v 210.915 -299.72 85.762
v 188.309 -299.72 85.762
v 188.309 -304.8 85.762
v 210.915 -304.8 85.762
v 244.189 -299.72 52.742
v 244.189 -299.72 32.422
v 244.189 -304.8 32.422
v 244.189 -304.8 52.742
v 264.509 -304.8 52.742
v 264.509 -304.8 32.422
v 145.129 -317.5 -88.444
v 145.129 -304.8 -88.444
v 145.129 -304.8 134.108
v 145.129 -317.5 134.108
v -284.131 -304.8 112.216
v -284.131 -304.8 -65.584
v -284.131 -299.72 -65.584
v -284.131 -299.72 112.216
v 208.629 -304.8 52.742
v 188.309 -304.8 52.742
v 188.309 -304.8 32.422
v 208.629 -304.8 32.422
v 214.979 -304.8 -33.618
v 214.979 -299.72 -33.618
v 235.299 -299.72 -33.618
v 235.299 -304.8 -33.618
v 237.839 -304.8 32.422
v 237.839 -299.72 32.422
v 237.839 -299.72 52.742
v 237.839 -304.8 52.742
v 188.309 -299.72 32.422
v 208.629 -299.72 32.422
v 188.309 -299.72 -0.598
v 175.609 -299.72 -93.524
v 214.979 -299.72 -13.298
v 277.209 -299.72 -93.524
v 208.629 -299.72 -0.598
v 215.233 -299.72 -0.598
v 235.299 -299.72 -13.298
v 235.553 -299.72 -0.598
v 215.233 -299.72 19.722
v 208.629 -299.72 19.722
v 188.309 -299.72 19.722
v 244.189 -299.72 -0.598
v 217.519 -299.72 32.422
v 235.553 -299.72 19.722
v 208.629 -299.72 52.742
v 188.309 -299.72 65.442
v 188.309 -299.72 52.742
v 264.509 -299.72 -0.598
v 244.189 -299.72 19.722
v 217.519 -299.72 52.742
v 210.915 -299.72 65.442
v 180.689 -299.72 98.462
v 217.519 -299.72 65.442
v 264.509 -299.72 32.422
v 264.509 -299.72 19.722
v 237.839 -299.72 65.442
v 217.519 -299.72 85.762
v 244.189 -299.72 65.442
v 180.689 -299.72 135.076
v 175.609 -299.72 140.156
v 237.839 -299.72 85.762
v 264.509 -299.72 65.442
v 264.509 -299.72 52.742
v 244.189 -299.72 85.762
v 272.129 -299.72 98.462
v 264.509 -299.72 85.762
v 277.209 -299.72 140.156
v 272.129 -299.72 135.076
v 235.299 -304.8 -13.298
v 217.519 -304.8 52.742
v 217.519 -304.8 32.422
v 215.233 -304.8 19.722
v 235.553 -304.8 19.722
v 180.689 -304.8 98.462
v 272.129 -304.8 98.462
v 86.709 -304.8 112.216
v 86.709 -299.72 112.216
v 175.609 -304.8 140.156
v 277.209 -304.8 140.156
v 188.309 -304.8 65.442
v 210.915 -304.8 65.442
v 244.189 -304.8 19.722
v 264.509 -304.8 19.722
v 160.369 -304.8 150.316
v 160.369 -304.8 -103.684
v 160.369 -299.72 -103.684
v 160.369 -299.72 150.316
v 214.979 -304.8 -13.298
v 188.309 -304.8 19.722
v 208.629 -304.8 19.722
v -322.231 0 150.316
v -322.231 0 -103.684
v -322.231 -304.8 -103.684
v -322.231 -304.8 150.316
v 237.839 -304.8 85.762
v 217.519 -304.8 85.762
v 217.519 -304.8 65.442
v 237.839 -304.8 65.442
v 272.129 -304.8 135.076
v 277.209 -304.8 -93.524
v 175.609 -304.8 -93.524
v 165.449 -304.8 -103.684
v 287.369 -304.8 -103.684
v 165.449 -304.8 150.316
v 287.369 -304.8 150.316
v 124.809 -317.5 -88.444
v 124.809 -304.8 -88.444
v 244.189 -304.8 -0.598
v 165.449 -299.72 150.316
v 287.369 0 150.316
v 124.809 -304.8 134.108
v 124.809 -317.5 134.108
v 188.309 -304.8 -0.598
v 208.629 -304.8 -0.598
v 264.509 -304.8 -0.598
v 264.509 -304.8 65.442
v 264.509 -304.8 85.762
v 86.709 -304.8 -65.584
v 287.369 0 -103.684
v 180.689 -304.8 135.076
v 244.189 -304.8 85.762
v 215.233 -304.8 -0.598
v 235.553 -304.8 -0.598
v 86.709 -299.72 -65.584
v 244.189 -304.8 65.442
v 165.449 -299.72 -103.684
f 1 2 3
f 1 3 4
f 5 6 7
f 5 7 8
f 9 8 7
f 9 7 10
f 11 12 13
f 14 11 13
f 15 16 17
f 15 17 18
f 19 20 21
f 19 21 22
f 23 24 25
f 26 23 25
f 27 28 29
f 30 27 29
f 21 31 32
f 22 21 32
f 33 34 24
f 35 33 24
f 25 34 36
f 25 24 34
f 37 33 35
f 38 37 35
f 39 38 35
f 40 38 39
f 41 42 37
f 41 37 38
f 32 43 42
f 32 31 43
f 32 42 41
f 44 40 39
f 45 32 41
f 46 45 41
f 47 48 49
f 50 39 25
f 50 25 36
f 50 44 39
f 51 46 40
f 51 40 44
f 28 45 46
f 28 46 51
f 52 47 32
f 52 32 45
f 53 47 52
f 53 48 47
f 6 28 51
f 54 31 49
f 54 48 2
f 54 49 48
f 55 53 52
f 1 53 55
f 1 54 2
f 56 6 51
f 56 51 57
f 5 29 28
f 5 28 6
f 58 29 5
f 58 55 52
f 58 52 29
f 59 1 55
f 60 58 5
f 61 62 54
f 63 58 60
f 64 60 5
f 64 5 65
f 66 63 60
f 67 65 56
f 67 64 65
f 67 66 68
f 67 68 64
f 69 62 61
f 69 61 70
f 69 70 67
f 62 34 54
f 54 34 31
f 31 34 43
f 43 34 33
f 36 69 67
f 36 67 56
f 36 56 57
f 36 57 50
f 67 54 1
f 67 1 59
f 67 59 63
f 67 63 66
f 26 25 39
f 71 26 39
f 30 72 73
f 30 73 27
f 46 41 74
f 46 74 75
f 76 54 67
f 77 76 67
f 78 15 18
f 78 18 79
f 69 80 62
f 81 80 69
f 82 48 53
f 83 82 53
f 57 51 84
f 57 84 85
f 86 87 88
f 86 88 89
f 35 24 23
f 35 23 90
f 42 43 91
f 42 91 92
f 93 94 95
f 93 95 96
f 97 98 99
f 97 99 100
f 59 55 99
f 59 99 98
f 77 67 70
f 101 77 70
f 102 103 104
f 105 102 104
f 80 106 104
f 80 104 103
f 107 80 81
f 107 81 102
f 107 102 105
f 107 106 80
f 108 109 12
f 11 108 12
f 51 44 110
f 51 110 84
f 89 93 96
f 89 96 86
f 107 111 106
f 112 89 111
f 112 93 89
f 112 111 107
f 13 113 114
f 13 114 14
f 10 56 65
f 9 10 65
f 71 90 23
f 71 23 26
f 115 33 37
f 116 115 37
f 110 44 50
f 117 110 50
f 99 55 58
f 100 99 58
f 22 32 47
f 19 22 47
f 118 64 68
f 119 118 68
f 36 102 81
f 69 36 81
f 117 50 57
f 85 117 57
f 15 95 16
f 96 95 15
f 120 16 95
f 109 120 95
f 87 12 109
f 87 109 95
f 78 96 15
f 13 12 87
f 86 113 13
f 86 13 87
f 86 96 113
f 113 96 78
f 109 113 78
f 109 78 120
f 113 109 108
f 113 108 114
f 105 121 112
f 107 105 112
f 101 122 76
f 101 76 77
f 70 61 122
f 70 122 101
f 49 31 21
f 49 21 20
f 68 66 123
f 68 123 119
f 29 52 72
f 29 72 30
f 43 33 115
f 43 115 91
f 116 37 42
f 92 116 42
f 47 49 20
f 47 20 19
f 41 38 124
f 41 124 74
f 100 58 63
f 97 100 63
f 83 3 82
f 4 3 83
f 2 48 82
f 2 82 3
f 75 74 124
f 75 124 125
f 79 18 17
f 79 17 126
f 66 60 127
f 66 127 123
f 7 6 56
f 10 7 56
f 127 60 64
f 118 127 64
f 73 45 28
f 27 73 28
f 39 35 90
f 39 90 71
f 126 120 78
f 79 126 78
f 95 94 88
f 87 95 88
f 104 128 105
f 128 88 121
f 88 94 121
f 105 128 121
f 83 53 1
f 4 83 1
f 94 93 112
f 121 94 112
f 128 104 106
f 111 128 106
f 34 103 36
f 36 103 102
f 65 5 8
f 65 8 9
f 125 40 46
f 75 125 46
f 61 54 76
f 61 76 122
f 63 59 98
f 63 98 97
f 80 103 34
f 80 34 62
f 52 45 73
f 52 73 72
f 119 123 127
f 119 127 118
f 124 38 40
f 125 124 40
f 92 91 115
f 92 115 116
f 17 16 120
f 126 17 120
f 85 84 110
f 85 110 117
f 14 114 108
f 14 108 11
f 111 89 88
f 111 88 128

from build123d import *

# Parameters (mm, degrees)
F0_W      = 609.6
F0_H      = 254
F1_DEPTH  = 304.8
F2_W      = 101.6
F2_H      = 233.68
F3_DEPTH  = 5.08
F4_W      = 5.08
F4_H      = 254
F5_DEPTH  = 5.08
F6_W      = 91.44
F6_H      = 36.614052
F6_W_2    = 22.606
F6_H_2    = 20.32
F6_W_3    = 20.32
F7_DEPTH  = 5.08
F8_W      = 20.32
F8_H      = 222.552294
F9_DEPTH  = 12.7
F10_W     = 370.84
F10_H     = 177.8
F11_DEPTH = 5.08


with BuildPart() as f1:
    # F0 (on Front) → F1 (new body)
    with BuildSketch(Plane.XZ):
        with Locations((-17.430749, 23.316116)):
            Rectangle(F0_W, F0_H)
    extrude(amount=F1_DEPTH)

    # F2 (on face) → F3 (cut)
    with BuildSketch(Plane.XZ.offset(304.8)):
        with Locations((226.409251, 23.316116)):
            Rectangle(F2_W, F2_H)
    extrude(amount=-F3_DEPTH, mode=Mode.SUBTRACT)

    # F4 (on face) → F5 (cut)
    with BuildSketch(Plane.XZ.offset(304.8)):
        with Locations((162.909251, 23.316116)):
            Rectangle(F4_W, F4_H)
    extrude(amount=-F5_DEPTH, mode=Mode.SUBTRACT)

    # F6 (on face) → F7 (join)
    with BuildSketch(Plane.XZ.offset(299.72)):
        with Locations((226.409251, 116.76909)):
            Rectangle(F6_W, F6_H)
        with Locations((199.612251, 75.602064)):
            Rectangle(F6_W_2, F6_H_2)
        with Locations((227.679251, 75.602064)):
            Rectangle(F6_W_3, F6_H_2)
        with Locations((254.349251, 75.602064)):
            Rectangle(F6_W_3, F6_H_2)
        with Locations((198.469251, 42.582064)):
            Rectangle(F6_W_3, F6_H_2)
        with Locations((227.679251, 42.582064)):
            Rectangle(F6_W_3, F6_H_2)
        with Locations((254.349251, 42.582064)):
            Rectangle(F6_W_3, F6_H_2)
        with Locations((198.469251, 9.562064)):
            Rectangle(F6_W_3, F6_H_2)
        with Locations((225.393251, 9.562064)):
            Rectangle(F6_W_3, F6_H_2)
        with Locations((254.349251, 9.562064)):
            Rectangle(F6_W_3, F6_H_2)
        with Locations((225.139251, -23.457936)):
            Rectangle(F6_W_3, F6_H_2)
    extrude(amount=F7_DEPTH)

    # F8 (on face) → F9 (join)
    with BuildSketch(Plane.XZ.offset(304.8)):
        with Locations((134.969251, 22.832263)):
            Rectangle(F8_W, F8_H)
    extrude(amount=F9_DEPTH)

    # F10 (on face) → F11 (cut)
    with BuildSketch(Plane.XZ.offset(304.8)):
        with Locations((-98.710749, 23.316116)):
            Rectangle(F10_W, F10_H)
    extrude(amount=-F11_DEPTH, mode=Mode.SUBTRACT)


solid = f1.part
